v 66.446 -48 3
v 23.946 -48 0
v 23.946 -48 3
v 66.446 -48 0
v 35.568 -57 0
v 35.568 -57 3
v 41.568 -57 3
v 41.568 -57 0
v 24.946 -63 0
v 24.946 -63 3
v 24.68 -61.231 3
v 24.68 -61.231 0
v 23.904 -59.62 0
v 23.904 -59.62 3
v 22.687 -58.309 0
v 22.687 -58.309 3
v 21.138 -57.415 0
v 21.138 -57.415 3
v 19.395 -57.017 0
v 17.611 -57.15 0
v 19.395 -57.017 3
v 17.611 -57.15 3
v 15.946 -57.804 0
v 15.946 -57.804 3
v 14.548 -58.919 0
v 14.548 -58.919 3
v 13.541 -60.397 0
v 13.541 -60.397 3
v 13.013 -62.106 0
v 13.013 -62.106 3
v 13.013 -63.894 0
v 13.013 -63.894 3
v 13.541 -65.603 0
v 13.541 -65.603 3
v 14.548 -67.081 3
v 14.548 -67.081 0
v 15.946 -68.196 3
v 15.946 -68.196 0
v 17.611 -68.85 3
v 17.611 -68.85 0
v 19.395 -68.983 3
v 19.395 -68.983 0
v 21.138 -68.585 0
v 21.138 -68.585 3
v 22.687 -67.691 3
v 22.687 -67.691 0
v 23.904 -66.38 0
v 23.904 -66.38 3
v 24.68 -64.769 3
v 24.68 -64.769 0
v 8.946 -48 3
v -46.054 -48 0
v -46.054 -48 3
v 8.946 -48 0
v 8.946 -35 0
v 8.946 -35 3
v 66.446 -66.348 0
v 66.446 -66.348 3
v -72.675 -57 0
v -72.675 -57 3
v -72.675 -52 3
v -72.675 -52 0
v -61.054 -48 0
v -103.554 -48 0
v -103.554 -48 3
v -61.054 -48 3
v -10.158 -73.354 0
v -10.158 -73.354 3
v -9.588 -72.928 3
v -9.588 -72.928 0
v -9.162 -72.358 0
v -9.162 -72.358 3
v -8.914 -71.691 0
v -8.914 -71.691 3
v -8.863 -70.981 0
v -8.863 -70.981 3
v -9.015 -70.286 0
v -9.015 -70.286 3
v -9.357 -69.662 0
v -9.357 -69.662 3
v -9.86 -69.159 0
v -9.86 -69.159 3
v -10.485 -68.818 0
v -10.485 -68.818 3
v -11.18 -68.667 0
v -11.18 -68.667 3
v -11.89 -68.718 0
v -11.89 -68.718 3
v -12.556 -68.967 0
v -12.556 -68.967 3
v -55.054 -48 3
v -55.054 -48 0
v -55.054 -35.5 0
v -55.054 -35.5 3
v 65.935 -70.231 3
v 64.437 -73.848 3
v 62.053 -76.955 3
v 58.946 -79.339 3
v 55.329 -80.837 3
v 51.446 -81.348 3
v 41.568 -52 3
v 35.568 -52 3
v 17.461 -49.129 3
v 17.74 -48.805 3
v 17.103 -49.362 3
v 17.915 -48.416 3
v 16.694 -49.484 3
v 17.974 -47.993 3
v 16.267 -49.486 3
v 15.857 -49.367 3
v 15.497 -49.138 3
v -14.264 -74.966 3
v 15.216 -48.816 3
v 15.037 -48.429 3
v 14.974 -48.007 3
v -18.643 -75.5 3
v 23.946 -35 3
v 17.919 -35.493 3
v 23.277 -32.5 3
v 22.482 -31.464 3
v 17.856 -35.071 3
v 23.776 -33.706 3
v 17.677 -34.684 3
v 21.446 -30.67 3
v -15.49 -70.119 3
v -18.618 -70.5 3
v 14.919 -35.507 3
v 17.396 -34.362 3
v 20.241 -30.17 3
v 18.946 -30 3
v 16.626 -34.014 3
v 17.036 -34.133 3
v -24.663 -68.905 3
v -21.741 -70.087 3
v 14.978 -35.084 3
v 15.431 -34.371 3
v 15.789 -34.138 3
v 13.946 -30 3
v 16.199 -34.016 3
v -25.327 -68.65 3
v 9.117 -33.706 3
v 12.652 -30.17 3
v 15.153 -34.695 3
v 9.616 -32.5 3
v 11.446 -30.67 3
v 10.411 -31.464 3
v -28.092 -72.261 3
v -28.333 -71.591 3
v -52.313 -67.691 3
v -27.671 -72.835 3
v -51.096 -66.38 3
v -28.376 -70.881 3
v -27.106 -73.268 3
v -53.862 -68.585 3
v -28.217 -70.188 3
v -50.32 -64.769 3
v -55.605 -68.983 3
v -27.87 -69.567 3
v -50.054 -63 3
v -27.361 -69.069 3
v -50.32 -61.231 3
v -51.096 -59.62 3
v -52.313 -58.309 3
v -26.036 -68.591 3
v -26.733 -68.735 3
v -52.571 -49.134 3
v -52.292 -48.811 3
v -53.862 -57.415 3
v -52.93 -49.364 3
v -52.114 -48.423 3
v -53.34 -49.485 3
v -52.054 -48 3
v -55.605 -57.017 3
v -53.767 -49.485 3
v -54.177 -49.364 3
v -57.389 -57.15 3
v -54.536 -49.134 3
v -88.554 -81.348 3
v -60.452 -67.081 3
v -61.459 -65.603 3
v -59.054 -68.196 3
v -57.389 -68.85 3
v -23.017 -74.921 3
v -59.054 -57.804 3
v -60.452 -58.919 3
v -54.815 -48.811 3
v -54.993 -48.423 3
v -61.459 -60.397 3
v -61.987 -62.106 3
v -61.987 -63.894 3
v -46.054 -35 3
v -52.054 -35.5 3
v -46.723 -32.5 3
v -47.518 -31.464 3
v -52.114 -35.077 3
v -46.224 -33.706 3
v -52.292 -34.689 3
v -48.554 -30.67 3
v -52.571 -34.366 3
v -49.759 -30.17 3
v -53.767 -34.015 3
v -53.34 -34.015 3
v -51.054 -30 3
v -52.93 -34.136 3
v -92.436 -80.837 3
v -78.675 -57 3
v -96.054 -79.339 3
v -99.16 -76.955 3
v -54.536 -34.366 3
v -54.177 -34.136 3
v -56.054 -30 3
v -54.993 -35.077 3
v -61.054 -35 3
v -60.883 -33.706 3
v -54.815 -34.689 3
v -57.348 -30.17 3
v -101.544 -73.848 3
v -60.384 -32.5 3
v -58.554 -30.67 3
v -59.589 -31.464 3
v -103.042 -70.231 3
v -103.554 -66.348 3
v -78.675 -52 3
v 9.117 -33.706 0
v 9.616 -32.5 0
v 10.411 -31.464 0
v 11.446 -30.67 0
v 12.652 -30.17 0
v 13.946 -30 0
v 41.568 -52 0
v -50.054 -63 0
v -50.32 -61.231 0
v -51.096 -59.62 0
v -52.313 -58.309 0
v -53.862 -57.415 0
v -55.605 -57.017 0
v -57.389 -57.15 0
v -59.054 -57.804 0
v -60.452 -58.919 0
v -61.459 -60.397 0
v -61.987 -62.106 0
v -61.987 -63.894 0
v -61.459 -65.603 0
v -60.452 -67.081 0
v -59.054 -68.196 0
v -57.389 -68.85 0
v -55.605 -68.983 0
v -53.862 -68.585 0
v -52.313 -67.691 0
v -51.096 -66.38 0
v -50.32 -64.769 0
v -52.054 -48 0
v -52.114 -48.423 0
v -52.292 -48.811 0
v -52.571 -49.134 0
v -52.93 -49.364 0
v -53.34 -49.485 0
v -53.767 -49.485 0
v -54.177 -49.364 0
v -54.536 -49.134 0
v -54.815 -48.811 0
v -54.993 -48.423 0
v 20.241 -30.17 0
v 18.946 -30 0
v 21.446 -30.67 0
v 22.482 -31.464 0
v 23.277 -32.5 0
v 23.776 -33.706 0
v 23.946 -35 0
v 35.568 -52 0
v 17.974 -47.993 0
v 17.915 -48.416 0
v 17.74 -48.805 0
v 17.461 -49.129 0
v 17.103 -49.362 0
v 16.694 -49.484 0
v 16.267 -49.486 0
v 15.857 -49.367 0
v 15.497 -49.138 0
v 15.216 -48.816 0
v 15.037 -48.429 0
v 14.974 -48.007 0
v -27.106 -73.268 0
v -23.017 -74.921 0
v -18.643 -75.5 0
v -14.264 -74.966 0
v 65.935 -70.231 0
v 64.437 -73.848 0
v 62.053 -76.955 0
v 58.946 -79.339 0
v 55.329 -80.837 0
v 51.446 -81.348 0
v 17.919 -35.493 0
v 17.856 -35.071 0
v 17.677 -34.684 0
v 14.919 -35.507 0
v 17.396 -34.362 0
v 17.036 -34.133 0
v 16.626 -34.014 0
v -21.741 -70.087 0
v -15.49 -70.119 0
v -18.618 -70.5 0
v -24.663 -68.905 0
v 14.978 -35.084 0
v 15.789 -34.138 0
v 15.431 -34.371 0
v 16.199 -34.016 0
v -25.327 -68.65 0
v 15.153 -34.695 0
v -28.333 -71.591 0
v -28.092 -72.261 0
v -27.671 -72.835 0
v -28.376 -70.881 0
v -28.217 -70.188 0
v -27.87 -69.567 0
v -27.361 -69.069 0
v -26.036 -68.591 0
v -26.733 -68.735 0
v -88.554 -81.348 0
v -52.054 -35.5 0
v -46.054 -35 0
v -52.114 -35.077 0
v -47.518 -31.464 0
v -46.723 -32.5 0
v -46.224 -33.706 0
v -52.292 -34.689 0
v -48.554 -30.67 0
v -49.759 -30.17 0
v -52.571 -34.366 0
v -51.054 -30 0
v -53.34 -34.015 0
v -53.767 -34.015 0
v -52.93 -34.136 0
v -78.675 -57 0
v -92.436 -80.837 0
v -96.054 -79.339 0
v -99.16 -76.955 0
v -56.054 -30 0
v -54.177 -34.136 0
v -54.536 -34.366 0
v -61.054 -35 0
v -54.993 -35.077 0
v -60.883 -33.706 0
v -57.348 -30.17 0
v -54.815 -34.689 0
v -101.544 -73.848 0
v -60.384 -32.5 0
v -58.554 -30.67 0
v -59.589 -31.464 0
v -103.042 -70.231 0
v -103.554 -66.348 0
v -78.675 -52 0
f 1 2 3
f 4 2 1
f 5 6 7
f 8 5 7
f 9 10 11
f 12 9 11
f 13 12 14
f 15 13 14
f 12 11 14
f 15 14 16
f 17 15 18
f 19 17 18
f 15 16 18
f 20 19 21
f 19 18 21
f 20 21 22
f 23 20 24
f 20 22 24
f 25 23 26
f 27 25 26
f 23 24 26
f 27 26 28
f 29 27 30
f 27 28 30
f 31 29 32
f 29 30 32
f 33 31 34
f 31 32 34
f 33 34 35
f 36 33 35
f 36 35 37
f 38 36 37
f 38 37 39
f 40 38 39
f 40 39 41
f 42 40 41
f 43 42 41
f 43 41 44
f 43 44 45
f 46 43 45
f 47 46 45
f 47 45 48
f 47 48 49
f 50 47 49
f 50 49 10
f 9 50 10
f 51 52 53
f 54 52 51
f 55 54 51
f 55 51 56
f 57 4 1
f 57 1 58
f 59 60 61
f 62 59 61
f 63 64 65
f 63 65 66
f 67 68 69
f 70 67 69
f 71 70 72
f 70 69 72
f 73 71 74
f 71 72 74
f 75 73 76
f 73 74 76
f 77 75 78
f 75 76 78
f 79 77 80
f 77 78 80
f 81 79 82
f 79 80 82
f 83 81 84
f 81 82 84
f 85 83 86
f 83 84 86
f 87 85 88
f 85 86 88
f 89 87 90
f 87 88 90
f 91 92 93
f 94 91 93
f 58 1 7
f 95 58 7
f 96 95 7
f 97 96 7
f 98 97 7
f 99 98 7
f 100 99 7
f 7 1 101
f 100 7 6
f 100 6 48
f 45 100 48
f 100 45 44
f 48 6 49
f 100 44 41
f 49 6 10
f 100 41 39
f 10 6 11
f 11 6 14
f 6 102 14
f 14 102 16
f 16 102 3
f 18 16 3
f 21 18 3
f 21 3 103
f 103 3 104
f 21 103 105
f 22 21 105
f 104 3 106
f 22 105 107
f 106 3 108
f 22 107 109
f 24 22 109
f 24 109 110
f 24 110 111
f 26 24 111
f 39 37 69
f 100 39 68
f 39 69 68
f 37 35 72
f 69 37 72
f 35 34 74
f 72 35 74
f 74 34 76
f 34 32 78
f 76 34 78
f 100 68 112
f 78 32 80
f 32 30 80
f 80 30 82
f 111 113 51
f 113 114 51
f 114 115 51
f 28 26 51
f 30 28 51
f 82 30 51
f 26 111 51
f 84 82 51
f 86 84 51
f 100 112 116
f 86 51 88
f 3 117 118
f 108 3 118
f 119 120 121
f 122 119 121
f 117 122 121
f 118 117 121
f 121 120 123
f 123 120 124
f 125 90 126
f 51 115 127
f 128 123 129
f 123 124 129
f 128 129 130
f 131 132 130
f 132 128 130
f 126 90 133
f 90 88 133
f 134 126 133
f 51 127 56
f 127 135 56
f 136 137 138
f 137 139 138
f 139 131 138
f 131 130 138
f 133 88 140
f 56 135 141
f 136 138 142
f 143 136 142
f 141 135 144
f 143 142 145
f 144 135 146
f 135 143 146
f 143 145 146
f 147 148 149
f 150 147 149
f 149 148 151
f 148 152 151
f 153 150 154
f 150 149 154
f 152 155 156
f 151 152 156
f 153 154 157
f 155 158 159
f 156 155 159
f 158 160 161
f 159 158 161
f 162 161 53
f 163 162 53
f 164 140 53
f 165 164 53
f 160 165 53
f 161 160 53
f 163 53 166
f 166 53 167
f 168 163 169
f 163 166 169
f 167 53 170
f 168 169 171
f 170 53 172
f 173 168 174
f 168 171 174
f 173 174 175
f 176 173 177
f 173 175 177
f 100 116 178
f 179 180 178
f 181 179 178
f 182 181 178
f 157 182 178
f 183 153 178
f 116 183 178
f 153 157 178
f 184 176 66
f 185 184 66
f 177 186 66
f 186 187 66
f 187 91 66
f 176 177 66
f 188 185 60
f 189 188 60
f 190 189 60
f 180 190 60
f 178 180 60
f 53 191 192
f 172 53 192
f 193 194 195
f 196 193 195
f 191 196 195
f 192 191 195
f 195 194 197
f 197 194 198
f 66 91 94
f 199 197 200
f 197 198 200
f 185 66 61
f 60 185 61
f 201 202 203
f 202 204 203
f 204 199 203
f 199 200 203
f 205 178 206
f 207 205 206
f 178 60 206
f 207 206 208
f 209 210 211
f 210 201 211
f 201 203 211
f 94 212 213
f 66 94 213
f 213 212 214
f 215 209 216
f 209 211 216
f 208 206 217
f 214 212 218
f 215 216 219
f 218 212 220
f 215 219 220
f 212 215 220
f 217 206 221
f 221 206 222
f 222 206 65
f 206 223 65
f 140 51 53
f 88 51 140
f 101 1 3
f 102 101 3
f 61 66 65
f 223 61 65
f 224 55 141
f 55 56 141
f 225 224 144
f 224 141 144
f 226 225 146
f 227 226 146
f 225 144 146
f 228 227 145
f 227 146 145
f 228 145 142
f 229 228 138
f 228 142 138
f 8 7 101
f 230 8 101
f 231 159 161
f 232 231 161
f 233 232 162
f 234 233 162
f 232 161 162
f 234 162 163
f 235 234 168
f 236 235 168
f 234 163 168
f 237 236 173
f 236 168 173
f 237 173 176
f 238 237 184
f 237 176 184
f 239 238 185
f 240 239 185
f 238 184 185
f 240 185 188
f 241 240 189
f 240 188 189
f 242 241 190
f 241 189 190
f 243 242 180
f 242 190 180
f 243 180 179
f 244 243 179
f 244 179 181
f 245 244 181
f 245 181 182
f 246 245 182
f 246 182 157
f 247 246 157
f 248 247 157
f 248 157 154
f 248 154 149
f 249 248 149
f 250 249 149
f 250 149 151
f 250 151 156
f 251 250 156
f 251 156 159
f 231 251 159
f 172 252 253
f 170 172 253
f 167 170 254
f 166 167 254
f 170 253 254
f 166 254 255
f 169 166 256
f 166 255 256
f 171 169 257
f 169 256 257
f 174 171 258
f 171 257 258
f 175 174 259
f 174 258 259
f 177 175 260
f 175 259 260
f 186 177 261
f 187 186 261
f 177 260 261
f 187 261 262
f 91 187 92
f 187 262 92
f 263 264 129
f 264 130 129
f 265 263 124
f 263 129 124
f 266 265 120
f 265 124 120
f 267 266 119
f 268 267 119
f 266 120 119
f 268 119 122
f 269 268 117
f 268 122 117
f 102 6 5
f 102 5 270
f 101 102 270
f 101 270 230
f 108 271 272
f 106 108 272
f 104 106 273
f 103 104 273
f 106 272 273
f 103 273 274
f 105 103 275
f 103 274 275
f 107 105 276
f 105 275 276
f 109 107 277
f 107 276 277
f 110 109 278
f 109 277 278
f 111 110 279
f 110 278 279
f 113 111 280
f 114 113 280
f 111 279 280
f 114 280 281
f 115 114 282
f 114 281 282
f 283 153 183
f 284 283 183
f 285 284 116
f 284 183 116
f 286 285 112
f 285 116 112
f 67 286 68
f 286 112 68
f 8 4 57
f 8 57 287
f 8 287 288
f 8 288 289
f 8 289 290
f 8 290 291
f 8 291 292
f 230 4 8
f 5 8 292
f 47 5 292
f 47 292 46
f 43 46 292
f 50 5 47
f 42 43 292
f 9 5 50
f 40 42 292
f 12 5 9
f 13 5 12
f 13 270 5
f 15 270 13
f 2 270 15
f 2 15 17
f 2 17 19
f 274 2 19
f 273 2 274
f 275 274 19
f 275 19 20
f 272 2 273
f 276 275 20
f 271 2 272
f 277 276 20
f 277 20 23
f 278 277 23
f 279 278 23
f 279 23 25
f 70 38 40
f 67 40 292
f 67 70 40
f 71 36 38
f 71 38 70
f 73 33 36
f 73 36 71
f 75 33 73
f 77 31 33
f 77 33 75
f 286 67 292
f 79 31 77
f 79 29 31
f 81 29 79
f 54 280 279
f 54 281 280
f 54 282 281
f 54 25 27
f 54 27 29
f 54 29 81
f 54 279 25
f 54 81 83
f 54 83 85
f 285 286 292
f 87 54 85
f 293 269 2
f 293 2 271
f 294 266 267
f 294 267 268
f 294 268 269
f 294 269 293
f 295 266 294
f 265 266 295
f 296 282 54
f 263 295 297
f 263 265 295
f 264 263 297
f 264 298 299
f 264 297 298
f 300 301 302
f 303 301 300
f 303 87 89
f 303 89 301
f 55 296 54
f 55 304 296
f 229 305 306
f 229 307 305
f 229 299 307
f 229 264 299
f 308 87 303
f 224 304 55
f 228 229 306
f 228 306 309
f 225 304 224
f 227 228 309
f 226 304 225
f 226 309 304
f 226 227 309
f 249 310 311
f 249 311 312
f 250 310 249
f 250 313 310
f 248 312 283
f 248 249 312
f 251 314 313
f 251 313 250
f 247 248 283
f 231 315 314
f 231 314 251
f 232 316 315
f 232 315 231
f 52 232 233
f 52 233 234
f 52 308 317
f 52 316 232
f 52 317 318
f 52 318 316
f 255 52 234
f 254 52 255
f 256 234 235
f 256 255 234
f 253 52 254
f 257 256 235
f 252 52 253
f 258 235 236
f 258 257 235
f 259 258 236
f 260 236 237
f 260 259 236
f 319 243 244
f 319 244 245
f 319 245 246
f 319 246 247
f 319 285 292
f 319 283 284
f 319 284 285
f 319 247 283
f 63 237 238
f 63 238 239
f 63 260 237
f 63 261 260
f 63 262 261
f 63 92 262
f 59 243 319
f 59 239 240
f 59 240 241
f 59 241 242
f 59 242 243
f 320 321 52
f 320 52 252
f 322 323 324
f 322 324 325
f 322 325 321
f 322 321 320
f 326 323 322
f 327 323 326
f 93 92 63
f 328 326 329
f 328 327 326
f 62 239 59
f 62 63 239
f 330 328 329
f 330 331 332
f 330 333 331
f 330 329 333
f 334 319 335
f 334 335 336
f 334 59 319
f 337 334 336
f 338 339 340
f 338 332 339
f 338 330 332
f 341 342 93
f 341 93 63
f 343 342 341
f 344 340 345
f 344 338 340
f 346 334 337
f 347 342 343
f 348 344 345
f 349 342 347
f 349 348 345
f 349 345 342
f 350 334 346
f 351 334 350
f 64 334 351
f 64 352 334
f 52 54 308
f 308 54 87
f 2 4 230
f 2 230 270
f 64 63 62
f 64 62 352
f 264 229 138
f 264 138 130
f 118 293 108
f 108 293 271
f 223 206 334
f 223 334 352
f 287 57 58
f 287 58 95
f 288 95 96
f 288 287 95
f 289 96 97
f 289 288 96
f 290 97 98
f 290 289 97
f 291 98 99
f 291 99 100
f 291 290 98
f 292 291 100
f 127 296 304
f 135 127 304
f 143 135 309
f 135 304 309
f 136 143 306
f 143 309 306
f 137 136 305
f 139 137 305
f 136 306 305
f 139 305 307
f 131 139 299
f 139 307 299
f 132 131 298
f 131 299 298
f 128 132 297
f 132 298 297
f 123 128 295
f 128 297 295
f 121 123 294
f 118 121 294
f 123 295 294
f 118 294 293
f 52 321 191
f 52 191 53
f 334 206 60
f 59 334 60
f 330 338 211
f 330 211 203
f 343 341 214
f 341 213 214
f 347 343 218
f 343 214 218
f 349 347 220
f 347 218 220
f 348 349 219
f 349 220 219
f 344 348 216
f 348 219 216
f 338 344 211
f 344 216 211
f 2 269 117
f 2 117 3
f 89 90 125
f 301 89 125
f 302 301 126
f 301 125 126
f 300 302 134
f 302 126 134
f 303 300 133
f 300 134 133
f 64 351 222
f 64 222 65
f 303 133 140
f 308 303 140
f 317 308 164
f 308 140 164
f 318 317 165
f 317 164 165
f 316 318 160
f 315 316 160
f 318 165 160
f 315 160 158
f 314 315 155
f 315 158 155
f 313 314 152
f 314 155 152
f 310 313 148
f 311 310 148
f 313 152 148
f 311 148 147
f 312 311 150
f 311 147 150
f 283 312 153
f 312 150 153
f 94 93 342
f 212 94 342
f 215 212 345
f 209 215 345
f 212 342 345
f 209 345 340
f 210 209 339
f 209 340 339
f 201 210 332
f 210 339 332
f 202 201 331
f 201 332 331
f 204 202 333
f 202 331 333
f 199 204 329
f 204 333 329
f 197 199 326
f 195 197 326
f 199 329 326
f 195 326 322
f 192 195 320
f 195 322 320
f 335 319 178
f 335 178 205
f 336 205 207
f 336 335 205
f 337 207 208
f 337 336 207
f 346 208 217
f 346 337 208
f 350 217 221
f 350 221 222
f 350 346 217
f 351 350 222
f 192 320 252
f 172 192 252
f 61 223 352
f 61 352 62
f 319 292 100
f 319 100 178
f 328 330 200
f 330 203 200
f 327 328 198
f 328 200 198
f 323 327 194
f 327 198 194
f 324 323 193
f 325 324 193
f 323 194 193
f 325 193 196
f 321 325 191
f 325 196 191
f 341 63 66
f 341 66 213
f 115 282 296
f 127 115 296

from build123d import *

# Parameters (mm, degrees)
BOSS_EXTRUDE1_DEPTH = 3
FILLET2_R           = 5
SKETCH3_R           = 6
CUT_EXTRUDE1_DEPTH  = 10
SKETCH4_W           = 6
SKETCH4_H           = 5
CUT_EXTRUDE2_DEPTH  = 10


with BuildPart() as part:
    # Sketch1 → Boss-Extrude1 (new body)
    with BuildSketch(Plane.XY):
        with BuildLine():
            Line((-103.55358225, -48), (-61.05358225, -48))
            Line((-61.05358225, -48), (-61.05358225, -30))
            Line((-61.05358225, -30), (-46.05358225, -30))
            Line((-46.05358225, -30), (-46.05358225, -48))
            Line((-46.05358225, -48), (8.94641775, -48))
            Line((8.94641775, -48), (8.94641775, -30))
            Line((8.94641775, -30), (23.94641775, -30))
            Line((23.94641775, -30), (23.94641775, -48))
            Line((23.94641775, -48), (66.44641775, -48))
            Line((66.44641775, -48), (66.44641775, -66.348486101))
            ThreePointArc((66.44641775, -66.348486101), (62.053019468, -76.955087819), (51.44641775, -81.348486101))
            Line((51.44641775, -81.348486101), (-88.55358225, -81.348486101))
            ThreePointArc((-88.55358225, -81.348486101), (-99.160183967, -76.955087819), (-103.55358225, -66.348486101))
            Line((-103.55358225, -66.348486101), (-103.55358225, -48))
        make_face()
        with BuildLine():
            Line((-55.05358225, -48.000000021), (-55.05358225, -35.500000021))
            ThreePointArc((-55.05358225, -35.500000021), (-53.55358225, -34.000000021), (-52.05358225, -35.500000021))
            Line((-52.05358225, -35.500000021), (-52.05358225, -48.000000021))
            ThreePointArc((-52.05358225, -48.000000021), (-53.55358225, -49.500000021), (-55.05358225, -48.000000021))
        make_face(mode=Mode.SUBTRACT)
        with BuildLine():
            Line((14.97417929, -48.006597652), (14.918685775, -35.506720833))
            ThreePointArc((14.918685775, -35.506720833), (16.412011771, -34.000076394), (17.918656211, -35.49340239))
            Line((17.918656211, -35.49340239), (17.974149726, -47.993279208))
            ThreePointArc((17.974149726, -47.993279208), (16.48082373, -49.499923648), (14.97417929, -48.006597652))
        make_face(mode=Mode.SUBTRACT)
    extrude(amount=BOSS_EXTRUDE1_DEPTH)

    # Fillet2
    fillet2_edges = [part.edges().sort_by_distance(p)[0] for p in [
        (-61.05358225, -30, 1.5),
        (-46.05358225, -30, 1.5),
        (8.94641775, -30, 1.5),
        (23.94641775, -30, 1.5),
    ]]
    fillet(fillet2_edges, radius=FILLET2_R)

    # Sketch3 → Cut-Extrude1 (cut)
    with BuildSketch(Plane.XY.offset(3)):
        with Locations((-56.05358225, -63)):
            Circle(SKETCH3_R)
        with Locations((18.94641775, -63)):
            Circle(SKETCH3_R)
        with BuildLine():
            ThreePointArc((-27.106412897, -73.26758291), (-18.643210609, -75.499770477), (-10.157587782, -73.354389499))
            ThreePointArc((-10.157587782, -73.354389499), (-9.163531348, -69.961477504), (-12.556443344, -68.967421071))
            ThreePointArc((-12.556443344, -68.967421071), (-18.617602506, -70.499836055), (-24.662746998, -68.905416364))
            ThreePointArc((-24.662746998, -68.905416364), (-28.06566322, -69.864666688), (-27.106412897, -73.26758291))
        make_face()
    extrude(amount=-CUT_EXTRUDE1_DEPTH, mode=Mode.SUBTRACT)

    # Sketch4 → Cut-Extrude2 (cut)
    with BuildSketch(Plane.XY.offset(3)):
        with Locations((38.567805477, -54.5)):
            Rectangle(SKETCH4_W, SKETCH4_H)
        with Locations((-75.674969976, -54.5)):
            Rectangle(SKETCH4_W, SKETCH4_H)
    extrude(amount=-CUT_EXTRUDE2_DEPTH, mode=Mode.SUBTRACT)


solid = part.part
